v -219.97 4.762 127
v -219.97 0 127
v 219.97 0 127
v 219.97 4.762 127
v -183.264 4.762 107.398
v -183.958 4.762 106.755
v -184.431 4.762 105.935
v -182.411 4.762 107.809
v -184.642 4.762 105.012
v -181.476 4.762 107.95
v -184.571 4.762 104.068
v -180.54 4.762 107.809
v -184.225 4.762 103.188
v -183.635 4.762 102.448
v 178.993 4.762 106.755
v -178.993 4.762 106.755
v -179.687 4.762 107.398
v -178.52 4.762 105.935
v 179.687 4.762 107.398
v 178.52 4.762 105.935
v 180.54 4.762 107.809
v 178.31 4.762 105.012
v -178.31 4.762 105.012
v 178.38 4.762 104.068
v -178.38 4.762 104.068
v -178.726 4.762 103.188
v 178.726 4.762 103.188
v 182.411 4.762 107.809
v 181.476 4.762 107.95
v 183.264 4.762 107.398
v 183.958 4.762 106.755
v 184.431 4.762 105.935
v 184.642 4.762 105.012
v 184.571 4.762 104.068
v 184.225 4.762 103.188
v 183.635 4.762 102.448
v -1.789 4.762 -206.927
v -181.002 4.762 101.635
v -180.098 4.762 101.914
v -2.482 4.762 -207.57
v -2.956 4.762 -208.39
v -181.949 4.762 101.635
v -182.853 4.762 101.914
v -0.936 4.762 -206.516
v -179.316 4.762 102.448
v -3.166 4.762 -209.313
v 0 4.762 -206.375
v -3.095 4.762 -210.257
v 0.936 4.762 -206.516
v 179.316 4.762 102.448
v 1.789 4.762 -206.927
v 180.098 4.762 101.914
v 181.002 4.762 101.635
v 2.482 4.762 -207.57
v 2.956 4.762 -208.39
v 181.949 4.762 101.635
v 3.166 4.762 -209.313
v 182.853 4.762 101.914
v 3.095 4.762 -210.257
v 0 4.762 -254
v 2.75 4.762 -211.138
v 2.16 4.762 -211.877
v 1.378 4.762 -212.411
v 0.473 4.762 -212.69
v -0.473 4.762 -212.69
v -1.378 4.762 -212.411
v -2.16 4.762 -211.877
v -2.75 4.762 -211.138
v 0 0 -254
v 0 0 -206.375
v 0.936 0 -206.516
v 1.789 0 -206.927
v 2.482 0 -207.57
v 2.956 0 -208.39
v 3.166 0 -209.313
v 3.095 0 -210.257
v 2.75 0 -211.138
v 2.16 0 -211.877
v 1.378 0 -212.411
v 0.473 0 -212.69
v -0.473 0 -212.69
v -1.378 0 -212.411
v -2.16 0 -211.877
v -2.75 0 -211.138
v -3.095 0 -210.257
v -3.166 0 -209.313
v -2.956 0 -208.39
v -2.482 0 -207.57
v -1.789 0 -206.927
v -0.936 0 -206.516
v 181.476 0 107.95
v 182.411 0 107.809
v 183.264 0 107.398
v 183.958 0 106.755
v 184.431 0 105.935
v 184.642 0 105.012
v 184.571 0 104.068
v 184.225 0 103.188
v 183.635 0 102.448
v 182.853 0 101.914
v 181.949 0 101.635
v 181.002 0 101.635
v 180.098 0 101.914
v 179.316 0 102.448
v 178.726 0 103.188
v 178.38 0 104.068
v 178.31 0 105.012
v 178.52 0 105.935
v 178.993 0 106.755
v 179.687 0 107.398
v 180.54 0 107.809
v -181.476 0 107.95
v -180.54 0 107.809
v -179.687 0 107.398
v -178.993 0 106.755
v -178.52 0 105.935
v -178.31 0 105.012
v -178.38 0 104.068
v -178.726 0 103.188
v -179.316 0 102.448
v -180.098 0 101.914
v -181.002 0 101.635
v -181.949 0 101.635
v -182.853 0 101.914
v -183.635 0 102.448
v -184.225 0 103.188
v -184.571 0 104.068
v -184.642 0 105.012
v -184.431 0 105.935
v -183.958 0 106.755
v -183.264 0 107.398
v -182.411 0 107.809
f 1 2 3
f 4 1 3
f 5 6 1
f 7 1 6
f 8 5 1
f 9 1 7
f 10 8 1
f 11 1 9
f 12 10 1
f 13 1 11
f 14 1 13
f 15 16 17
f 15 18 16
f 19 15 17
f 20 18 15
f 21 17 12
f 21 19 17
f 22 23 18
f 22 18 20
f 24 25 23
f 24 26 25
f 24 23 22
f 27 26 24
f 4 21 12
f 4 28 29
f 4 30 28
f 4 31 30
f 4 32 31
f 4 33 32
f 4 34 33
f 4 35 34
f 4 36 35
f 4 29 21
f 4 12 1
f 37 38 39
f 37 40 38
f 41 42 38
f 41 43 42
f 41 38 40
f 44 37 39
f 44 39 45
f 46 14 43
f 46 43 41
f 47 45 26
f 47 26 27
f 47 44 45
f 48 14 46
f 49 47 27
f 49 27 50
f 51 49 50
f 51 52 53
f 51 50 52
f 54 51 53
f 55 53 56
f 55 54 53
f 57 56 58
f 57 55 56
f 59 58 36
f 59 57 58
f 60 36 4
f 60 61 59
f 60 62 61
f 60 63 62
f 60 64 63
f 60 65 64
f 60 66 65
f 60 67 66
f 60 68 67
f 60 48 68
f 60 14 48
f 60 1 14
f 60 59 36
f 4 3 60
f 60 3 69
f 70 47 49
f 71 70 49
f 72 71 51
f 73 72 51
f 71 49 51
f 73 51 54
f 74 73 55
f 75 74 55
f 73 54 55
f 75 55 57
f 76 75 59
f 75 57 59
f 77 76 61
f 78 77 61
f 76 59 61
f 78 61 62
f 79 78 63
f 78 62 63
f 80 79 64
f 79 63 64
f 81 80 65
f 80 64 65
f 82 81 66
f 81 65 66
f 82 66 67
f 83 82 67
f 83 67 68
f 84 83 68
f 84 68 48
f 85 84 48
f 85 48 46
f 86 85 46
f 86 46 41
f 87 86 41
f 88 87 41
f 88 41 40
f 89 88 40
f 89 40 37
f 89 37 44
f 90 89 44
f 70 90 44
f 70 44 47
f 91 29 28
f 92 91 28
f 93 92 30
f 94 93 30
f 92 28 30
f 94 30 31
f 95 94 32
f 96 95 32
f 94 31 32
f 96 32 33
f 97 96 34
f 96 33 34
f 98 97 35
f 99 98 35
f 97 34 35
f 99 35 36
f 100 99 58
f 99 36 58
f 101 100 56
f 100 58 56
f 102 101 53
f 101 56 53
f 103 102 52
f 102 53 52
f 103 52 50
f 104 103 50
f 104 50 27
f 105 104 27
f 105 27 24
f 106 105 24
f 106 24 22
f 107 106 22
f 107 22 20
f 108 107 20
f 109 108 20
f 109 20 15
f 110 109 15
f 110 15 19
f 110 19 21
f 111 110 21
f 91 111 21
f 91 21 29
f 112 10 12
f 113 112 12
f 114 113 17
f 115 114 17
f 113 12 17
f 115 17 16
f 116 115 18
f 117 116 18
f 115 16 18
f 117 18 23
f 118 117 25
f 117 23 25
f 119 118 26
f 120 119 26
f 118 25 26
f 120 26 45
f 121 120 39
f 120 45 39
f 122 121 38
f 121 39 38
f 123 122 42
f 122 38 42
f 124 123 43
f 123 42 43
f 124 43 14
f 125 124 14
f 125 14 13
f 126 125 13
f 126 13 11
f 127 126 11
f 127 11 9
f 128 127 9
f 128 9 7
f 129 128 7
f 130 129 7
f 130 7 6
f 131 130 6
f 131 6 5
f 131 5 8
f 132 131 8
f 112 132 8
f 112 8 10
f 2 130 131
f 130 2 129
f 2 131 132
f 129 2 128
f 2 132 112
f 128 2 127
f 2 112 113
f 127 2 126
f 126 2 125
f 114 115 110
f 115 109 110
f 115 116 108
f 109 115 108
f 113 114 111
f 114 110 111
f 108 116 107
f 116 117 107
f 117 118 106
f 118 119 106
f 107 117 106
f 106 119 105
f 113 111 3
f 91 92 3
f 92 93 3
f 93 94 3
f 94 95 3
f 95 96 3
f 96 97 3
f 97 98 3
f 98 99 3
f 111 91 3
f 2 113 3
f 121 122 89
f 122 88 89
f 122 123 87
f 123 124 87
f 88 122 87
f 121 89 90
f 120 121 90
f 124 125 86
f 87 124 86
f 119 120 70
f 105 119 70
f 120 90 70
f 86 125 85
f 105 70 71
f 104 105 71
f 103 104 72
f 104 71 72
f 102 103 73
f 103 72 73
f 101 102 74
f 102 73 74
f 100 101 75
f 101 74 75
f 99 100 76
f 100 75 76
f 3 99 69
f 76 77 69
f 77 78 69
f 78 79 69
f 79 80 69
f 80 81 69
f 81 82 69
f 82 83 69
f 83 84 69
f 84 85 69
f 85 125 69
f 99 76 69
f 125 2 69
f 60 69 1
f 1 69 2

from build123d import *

# Parameters (mm, degrees)
BOSS_EXTRUDE1_DEPTH = 4.7625
SKETCH2_R           = 3.175
CUT_EXTRUDE1_DEPTH  = 337.044165857


with BuildPart() as part:
    # Sketch1 → Boss-Extrude1 (new body)
    with BuildSketch(Plane(origin=(0, 0, 0), x_dir=(1, 0, 0), z_dir=(0, 1, 0))):
        Polygon((0, 254), (-219.970452561, -127), (219.970452561, -127), align=None)
    extrude(amount=BOSS_EXTRUDE1_DEPTH)

    # Sketch2 → Cut-Extrude1 (cut, through all)
    with BuildSketch(Plane(origin=(0, 4.7625, 0), x_dir=(1, 0, 0), z_dir=(0, 1, 0))):
        with Locations(Location((0, 209.55, 0), (0, 0, 270))):
            Circle(SKETCH2_R)
        with Locations(Location((-181.475623363, -104.775, 0), (0, 0, 270))):
            Circle(SKETCH2_R)
        with Locations(Location((181.475623363, -104.775, 0), (0, 0, 270))):
            Circle(SKETCH2_R)
    extrude(amount=-CUT_EXTRUDE1_DEPTH, mode=Mode.SUBTRACT)


solid = part.part
